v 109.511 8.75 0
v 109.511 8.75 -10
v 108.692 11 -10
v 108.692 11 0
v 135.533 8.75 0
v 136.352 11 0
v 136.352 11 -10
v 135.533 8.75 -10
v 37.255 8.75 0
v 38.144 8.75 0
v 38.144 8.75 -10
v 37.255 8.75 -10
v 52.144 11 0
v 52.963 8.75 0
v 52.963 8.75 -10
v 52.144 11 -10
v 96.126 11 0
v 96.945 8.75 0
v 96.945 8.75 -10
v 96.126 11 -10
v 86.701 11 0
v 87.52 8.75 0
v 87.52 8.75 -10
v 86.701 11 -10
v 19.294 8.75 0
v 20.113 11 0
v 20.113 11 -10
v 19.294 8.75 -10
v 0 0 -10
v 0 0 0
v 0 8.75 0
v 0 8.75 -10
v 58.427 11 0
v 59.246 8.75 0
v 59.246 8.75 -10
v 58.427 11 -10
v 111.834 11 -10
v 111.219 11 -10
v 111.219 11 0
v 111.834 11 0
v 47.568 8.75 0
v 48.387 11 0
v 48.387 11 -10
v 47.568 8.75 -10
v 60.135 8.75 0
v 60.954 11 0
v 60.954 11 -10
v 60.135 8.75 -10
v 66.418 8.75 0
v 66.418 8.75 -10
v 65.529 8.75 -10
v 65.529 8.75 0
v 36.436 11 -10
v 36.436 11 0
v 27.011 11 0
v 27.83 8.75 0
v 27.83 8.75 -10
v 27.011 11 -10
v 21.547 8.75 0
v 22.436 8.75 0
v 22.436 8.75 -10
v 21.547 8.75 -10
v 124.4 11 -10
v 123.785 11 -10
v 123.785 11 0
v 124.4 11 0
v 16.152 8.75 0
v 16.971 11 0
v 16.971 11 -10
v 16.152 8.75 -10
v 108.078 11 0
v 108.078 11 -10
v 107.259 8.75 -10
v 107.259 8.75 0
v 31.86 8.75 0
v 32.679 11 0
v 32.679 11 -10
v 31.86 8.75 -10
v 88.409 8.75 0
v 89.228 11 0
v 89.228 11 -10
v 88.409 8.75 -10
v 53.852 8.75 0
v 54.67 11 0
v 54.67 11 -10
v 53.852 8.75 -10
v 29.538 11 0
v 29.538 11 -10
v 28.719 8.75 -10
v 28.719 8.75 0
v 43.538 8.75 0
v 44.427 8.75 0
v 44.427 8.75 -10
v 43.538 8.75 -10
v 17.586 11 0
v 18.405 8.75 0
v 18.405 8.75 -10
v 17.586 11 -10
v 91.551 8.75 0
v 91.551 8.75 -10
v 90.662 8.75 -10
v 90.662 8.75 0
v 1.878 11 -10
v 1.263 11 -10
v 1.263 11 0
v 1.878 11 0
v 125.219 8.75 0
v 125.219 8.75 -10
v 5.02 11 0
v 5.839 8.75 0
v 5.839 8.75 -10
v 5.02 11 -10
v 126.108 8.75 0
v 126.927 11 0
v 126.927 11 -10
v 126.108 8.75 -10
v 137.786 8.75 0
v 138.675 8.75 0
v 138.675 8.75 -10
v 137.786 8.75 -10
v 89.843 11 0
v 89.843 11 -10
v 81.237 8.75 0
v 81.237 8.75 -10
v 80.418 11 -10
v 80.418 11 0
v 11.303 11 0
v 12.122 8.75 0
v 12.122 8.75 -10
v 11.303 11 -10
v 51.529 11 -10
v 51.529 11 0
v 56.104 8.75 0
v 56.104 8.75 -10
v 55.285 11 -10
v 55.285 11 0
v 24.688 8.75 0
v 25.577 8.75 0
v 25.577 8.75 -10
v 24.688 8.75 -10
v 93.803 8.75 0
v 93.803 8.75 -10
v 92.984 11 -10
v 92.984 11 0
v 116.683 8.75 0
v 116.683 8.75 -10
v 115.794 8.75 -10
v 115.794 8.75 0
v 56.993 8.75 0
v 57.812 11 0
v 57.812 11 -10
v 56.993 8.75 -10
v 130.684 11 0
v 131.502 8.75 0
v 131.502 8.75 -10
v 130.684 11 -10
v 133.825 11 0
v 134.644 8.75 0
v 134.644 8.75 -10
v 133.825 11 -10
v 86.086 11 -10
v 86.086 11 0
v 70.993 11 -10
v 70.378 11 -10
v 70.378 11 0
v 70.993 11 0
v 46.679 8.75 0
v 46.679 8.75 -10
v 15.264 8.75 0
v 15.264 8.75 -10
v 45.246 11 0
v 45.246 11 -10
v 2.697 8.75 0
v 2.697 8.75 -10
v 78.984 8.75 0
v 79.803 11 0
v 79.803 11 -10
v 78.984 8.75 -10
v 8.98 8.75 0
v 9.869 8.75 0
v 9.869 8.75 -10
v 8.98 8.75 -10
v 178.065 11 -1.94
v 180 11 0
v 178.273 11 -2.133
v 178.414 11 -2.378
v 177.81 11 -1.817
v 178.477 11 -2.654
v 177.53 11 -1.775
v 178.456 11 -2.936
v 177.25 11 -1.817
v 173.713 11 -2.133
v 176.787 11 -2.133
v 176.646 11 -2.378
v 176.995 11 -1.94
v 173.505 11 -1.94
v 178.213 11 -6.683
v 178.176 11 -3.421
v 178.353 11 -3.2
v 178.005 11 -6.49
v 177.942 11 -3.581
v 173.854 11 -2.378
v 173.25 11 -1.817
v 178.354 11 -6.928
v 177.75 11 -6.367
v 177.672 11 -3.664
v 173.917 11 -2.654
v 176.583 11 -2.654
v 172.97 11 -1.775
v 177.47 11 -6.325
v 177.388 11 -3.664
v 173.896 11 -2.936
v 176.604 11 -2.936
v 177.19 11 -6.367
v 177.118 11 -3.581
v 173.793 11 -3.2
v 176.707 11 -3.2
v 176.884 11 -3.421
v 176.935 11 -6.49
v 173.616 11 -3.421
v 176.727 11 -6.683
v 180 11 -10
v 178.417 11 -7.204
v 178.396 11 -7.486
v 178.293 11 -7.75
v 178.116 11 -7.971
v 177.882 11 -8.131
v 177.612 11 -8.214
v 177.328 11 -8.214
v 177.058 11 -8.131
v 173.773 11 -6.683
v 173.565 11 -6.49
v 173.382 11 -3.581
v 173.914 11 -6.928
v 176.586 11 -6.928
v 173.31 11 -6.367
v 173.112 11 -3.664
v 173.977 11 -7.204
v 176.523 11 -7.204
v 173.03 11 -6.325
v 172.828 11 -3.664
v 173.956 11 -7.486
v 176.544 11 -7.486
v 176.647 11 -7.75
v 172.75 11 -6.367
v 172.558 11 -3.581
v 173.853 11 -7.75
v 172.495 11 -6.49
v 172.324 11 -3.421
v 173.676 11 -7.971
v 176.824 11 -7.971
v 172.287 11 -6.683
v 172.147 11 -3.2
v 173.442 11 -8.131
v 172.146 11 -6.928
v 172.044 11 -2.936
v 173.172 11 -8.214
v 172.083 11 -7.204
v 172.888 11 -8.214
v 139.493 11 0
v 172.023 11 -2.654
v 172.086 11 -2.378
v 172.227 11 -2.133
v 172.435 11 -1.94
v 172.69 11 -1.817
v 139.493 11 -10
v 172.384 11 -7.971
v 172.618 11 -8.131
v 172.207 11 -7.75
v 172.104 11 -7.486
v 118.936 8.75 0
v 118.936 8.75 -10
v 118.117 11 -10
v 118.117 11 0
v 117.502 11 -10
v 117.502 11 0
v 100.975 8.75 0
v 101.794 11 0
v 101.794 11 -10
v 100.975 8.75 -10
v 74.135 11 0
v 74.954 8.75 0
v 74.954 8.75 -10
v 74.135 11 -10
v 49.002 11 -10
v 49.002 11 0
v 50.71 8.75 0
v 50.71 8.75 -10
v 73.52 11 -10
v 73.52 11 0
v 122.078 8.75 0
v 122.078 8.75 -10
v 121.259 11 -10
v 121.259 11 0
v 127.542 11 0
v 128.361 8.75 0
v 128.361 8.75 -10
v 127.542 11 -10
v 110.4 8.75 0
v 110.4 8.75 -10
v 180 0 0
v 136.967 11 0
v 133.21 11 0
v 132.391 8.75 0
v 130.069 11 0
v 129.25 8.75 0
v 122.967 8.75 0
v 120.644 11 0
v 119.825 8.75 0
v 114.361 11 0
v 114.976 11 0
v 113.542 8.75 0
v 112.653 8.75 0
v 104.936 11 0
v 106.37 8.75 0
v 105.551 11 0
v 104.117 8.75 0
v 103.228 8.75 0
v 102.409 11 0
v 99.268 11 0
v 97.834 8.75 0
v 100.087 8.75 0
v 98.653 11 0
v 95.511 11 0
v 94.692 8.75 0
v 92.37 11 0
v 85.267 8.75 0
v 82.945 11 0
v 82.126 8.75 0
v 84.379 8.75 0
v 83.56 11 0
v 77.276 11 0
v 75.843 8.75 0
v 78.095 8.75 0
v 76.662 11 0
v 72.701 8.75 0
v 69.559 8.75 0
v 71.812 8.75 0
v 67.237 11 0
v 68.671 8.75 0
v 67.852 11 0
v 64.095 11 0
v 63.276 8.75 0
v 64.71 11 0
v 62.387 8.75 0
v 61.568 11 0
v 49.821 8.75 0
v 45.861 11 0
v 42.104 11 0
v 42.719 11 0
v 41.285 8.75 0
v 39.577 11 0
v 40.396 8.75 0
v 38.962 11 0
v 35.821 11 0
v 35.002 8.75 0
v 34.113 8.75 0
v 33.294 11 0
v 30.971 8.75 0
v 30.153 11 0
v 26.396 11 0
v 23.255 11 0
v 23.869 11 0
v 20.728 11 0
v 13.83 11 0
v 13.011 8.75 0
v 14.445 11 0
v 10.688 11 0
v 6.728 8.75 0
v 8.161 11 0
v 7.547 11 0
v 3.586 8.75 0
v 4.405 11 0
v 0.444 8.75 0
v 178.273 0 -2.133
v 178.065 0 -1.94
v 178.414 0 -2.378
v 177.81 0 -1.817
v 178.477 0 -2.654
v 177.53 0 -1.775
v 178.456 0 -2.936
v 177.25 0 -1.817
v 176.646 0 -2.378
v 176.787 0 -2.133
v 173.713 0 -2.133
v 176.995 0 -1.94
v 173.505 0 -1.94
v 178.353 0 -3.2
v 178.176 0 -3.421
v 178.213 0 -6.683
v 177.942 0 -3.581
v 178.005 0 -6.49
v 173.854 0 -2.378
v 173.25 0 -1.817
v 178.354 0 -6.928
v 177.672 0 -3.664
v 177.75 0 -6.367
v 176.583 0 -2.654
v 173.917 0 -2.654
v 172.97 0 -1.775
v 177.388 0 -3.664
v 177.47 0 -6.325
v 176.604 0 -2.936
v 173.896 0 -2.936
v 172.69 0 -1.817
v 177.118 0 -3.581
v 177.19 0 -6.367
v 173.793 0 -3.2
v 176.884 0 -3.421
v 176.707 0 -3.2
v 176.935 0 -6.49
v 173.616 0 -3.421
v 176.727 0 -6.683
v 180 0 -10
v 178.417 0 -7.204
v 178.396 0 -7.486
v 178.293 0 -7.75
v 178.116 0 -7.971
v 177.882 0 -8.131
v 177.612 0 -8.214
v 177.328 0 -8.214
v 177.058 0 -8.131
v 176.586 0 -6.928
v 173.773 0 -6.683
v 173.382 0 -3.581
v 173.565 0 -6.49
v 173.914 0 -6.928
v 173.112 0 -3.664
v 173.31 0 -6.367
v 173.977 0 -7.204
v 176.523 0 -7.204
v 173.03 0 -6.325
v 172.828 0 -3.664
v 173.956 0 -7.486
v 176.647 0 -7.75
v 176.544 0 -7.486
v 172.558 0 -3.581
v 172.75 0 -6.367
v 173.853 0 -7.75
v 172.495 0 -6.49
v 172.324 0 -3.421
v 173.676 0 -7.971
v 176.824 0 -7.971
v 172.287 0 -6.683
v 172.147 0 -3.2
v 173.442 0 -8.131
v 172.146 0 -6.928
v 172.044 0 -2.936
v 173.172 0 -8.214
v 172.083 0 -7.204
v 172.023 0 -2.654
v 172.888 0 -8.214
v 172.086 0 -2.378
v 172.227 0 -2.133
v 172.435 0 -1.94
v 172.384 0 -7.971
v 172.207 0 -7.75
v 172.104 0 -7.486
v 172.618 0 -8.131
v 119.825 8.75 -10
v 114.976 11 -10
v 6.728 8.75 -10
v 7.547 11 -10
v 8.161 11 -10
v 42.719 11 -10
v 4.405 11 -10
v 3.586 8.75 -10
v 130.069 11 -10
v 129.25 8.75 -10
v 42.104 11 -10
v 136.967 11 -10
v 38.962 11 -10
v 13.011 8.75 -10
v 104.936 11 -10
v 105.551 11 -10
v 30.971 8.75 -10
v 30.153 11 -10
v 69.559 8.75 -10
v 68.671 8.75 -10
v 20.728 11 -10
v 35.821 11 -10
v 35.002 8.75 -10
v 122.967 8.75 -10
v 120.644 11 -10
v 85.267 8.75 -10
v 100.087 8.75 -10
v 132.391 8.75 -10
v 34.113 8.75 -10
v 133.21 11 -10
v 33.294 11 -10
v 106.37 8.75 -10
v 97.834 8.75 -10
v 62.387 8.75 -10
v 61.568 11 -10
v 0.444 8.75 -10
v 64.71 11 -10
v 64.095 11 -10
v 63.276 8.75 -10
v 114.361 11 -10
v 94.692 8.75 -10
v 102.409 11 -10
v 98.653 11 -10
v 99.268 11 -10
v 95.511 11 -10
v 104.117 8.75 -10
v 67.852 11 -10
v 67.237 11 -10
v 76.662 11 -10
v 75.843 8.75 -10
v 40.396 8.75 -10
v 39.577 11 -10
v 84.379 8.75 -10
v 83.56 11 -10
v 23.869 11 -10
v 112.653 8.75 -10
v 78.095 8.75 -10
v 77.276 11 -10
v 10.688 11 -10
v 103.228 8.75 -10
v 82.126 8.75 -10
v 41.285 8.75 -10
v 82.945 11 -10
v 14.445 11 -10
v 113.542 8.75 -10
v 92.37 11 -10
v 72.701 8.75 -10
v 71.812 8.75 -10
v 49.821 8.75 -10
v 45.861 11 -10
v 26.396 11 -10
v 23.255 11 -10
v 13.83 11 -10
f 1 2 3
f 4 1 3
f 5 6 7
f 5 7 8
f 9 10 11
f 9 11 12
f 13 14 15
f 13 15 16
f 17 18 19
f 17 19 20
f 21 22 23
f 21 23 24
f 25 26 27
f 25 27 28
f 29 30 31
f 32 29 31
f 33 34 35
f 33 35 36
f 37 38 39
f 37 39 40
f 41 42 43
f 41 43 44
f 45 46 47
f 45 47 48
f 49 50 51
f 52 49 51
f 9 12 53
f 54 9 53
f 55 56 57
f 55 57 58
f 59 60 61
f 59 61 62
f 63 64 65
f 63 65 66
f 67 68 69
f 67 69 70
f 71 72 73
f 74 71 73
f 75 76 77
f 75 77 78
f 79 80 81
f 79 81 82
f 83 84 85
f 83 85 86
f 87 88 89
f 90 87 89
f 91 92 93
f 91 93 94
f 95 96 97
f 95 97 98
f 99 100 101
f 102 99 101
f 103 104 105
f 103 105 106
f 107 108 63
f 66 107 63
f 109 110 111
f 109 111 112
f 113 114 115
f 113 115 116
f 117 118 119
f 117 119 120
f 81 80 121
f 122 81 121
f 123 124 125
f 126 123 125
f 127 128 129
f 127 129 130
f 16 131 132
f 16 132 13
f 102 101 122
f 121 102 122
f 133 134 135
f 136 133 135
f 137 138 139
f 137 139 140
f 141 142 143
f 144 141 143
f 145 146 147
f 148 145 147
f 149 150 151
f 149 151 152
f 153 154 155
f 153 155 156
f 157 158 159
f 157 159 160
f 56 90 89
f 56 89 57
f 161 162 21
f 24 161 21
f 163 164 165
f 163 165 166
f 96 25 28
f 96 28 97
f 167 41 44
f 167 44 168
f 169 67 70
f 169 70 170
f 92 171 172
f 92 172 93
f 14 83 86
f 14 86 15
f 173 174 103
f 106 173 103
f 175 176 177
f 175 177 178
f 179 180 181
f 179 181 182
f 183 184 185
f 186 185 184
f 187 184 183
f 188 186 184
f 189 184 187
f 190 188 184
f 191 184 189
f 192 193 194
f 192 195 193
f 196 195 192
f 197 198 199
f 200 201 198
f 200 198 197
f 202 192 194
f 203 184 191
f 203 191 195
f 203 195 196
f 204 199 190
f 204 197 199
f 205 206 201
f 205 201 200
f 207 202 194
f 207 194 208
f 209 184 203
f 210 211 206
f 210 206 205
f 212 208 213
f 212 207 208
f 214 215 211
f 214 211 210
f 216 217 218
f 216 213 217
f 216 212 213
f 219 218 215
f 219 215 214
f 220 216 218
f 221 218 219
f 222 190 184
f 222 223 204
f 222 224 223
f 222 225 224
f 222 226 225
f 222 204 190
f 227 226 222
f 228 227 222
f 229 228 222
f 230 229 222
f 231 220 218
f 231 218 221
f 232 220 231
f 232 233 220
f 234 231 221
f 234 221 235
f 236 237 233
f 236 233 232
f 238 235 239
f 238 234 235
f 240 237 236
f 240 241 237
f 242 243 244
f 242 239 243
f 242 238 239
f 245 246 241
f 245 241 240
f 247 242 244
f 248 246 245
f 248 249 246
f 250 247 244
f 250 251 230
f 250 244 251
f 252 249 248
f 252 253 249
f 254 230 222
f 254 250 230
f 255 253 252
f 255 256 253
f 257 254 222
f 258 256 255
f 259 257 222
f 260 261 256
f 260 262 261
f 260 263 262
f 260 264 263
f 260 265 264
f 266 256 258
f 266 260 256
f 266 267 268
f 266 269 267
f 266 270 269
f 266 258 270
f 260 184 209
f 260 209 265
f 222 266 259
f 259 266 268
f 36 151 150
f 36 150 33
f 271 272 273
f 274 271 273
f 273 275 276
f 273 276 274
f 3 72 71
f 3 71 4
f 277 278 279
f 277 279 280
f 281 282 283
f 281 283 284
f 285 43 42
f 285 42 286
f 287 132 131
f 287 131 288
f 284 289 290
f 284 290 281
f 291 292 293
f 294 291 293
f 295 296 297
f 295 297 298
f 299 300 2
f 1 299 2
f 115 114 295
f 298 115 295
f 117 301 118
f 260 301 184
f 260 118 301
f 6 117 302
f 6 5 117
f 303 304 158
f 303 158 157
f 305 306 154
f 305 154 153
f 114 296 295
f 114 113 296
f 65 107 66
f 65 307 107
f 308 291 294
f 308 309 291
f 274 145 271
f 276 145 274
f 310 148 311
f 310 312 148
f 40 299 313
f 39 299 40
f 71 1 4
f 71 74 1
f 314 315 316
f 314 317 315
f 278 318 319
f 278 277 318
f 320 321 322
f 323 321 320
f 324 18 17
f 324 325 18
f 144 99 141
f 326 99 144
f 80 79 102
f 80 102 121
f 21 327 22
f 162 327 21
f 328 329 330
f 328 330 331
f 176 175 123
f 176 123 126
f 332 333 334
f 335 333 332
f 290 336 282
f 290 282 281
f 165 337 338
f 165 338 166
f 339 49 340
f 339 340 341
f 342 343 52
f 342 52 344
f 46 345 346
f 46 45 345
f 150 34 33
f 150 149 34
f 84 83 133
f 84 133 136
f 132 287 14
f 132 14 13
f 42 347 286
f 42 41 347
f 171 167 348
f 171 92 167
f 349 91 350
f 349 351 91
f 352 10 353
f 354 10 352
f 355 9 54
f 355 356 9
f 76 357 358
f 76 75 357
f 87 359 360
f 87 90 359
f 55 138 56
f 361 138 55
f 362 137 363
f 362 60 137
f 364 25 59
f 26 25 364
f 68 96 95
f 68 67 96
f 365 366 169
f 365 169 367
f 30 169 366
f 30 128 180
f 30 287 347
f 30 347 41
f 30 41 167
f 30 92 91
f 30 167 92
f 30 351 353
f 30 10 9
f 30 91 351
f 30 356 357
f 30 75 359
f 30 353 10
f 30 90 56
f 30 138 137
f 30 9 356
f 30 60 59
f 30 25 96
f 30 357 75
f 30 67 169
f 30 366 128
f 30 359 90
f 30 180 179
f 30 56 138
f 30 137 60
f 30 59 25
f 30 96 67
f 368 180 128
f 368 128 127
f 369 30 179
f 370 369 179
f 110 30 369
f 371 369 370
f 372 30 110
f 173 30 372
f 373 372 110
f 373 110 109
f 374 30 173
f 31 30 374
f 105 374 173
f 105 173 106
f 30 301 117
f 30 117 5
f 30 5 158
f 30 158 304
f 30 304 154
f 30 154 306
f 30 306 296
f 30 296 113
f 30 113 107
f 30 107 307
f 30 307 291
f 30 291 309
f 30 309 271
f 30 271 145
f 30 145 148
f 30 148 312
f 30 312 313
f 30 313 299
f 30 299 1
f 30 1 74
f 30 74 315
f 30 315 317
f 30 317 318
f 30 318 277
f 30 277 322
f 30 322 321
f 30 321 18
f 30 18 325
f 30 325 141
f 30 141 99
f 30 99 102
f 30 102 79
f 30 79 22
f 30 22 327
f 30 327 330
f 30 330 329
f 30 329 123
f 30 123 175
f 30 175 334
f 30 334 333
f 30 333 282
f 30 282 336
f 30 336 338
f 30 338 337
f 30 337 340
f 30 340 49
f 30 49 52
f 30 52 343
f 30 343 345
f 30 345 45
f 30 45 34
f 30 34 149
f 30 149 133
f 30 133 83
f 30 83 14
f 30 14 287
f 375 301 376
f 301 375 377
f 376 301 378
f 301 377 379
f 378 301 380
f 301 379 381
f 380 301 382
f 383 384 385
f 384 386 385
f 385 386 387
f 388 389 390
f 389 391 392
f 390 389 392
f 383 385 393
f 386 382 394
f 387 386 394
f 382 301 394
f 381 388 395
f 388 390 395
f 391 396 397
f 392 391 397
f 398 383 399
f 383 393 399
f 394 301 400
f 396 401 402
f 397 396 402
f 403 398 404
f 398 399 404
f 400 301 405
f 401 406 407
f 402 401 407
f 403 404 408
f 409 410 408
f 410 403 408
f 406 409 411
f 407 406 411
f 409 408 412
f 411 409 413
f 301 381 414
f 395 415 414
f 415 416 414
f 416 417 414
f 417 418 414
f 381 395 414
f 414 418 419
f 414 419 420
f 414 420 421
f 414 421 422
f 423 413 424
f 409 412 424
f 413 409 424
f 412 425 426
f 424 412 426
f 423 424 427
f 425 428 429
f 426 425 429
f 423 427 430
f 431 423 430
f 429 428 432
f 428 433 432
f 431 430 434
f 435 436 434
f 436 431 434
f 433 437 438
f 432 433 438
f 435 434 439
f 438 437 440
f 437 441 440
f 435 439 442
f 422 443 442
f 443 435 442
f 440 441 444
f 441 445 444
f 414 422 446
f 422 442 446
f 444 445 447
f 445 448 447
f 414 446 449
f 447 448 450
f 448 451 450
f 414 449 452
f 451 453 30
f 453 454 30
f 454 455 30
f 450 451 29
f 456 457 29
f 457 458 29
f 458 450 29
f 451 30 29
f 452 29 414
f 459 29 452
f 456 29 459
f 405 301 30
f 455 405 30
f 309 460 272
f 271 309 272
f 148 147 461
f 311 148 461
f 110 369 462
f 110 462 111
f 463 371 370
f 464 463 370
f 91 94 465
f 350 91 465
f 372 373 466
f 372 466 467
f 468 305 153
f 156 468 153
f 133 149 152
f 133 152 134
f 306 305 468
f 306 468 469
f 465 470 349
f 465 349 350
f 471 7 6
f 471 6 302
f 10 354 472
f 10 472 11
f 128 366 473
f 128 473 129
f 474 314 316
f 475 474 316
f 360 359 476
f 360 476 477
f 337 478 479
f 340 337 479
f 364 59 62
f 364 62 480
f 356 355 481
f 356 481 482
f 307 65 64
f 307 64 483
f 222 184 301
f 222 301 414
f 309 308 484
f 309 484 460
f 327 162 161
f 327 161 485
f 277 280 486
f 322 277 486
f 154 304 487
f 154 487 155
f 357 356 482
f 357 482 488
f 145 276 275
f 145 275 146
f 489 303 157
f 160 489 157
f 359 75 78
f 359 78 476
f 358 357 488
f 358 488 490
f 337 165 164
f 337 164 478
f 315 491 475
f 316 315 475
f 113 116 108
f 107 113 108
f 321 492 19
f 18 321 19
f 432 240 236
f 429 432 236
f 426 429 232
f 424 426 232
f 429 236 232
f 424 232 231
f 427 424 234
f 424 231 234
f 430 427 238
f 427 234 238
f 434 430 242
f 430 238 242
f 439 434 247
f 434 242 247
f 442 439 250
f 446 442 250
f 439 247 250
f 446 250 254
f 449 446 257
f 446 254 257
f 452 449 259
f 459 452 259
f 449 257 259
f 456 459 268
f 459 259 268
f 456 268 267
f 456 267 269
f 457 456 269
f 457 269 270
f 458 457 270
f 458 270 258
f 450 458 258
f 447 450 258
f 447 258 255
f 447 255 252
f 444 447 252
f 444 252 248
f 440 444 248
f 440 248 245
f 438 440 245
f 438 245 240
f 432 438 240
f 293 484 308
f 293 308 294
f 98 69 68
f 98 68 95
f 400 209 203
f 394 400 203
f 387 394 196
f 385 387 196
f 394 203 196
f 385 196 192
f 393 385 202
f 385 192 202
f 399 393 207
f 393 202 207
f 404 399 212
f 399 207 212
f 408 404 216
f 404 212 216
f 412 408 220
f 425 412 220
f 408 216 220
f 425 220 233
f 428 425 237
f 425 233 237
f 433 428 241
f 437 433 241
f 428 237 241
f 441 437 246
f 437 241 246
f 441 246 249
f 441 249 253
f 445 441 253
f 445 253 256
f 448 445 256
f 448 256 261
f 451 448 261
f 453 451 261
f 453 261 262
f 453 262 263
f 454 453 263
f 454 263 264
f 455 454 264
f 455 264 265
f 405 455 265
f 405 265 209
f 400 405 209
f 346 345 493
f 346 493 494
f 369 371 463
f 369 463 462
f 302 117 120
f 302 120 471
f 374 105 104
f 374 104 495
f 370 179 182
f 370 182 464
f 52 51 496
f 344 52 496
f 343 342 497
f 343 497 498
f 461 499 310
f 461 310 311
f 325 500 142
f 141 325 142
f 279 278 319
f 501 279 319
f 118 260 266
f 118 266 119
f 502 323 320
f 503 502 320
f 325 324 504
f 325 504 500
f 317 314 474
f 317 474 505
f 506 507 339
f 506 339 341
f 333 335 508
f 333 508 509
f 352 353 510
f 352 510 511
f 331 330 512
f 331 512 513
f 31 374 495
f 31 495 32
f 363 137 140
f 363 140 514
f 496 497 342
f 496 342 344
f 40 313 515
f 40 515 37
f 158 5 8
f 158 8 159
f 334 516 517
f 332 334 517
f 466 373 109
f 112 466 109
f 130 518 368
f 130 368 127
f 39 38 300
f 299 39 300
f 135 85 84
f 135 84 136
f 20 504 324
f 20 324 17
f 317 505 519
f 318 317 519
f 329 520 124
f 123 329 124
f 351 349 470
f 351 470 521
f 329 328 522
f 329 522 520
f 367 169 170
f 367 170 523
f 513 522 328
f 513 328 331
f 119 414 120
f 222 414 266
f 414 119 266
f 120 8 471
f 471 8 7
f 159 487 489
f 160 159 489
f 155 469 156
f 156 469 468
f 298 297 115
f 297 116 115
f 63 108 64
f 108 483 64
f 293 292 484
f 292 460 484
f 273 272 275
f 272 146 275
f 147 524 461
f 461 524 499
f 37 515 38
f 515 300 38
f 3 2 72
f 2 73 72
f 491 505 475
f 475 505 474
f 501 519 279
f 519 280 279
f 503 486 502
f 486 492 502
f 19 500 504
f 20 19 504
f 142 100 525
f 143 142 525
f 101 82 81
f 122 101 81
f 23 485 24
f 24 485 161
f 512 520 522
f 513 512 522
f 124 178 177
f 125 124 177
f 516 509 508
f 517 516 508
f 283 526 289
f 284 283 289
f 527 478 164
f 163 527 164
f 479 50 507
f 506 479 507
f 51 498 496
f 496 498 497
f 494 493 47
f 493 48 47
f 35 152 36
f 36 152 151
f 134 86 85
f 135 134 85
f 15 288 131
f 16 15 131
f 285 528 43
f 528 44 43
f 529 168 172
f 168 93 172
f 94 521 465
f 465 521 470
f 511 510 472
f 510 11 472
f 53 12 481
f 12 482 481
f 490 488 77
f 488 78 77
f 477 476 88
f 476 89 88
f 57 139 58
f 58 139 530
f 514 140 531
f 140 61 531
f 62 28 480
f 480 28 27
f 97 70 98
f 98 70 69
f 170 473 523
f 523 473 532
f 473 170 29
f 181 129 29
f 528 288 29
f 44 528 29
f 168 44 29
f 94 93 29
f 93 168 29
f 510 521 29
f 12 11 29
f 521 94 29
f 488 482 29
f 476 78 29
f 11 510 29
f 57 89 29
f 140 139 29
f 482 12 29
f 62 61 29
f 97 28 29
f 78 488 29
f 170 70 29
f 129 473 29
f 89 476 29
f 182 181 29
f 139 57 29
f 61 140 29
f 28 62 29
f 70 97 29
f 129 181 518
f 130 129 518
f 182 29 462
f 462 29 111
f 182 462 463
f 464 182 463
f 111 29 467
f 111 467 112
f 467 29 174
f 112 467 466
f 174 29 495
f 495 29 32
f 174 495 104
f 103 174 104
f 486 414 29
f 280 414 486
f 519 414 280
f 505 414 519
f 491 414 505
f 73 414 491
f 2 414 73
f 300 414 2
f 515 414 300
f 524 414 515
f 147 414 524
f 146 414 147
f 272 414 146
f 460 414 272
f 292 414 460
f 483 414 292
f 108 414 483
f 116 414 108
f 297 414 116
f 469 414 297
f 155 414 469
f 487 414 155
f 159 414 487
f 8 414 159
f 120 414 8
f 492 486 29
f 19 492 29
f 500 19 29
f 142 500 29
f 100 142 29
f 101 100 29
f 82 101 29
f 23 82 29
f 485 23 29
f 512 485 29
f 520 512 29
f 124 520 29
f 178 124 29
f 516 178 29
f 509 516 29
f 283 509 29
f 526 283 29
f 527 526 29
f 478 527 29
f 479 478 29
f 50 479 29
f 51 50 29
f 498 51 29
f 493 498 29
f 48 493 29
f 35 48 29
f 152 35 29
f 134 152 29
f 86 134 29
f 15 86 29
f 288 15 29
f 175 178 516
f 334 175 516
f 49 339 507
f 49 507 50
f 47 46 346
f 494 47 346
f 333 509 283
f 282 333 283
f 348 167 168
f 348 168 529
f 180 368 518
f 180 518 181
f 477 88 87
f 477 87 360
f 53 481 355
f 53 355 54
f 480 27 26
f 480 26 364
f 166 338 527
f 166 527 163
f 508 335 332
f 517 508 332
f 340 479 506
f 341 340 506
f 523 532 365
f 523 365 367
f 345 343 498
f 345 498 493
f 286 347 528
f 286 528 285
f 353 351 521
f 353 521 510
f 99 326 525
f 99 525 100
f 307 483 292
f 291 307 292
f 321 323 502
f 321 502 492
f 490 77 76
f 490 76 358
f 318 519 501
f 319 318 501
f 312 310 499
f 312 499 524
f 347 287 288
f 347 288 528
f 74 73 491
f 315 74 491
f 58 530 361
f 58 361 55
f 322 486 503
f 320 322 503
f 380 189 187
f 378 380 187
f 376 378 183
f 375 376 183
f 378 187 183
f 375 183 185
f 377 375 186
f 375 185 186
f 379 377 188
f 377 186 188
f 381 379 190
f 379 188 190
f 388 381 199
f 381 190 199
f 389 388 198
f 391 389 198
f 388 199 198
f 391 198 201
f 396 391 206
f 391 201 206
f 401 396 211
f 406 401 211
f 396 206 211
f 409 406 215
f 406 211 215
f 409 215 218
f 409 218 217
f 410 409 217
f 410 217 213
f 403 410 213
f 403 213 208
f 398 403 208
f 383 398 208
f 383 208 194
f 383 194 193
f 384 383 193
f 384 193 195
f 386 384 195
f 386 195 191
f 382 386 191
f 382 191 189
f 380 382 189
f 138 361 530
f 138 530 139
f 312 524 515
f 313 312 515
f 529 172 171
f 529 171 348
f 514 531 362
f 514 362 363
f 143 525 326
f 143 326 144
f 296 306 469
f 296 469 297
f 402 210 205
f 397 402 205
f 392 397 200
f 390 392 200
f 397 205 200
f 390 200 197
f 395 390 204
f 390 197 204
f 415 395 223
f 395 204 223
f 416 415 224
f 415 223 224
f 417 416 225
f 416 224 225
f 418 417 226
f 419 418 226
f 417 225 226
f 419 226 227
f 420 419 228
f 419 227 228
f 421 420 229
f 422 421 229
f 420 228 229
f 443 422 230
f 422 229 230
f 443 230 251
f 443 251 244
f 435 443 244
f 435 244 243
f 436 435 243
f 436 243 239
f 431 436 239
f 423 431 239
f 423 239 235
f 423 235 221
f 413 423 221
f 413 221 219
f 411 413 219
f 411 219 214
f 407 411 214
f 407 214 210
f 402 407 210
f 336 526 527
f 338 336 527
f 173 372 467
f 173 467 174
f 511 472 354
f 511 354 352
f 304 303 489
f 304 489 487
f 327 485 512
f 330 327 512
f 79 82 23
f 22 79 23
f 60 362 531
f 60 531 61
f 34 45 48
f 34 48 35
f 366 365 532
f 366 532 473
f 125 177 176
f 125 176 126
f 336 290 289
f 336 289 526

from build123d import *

# Parameters (mm, degrees)
BLANKSKE_W          = 140
BLANKSKE_H          = 11
BLANK_DEPTH         = 10
TOOTHCUTSIM_DEPTH   = 141.78707327
TEETHCUTS_COUNT     = 46
TEETHCUTS_PITCH     = 3.14159265
SKETCH1_W           = 10
SKETCH1_H           = 11
BOSS_EXTRUDE1_DEPTH = 40
SKETCH3_R           = 0.95
CUT_EXTRUDE1_DEPTH  = 181.612845612


with BuildPart() as part:
    # BlankSke → Blank (new body)
    with BuildSketch(Plane.XY):
        with Locations((70, 5.5)):
            Rectangle(BLANKSKE_W, BLANKSKE_H)
    extrude(amount=-BLANK_DEPTH)

    # TooCutSkeSim → ToothCutSim (cut, through all)
    with BuildSketch(Plane.XY):
        Polygon((0.44443537, 8.75), (-0.44443537, 8.75), (-1.272613241, 11.0254), (1.272613241, 11.0254), align=None)
    toothcutsim = extrude(amount=-TOOTHCUTSIM_DEPTH, mode=Mode.SUBTRACT)

    # TeethCuts: ToothCutSim ×46
    with Locations(*[(i * TEETHCUTS_PITCH, 0, 0) for i in range(1, TEETHCUTS_COUNT)]):
        add(toothcutsim, mode=Mode.SUBTRACT)

    # Sketch1 → Boss-Extrude1 (add)
    with BuildSketch(Plane(origin=(140, 0, 0), x_dir=(0, 0, -1), z_dir=(1, 0, 0))):
        with Locations((5, 5.5)):
            Rectangle(SKETCH1_W, SKETCH1_H)
    extrude(amount=BOSS_EXTRUDE1_DEPTH)

    # Sketch3 → Cut-Extrude1 (cut, through all)
    with BuildSketch(Plane(origin=(0, 11, 0), x_dir=(1, 0, 0), z_dir=(0, 1, 0))):
        with Locations((173.03, 7.275)):
            Circle(SKETCH3_R)
        with Locations((177.47, 7.275)):
            Circle(SKETCH3_R)
        with Locations((177.53, 2.725)):
            Circle(SKETCH3_R)
        with Locations((172.97, 2.725)):
            Circle(SKETCH3_R)
    extrude(amount=-CUT_EXTRUDE1_DEPTH, mode=Mode.SUBTRACT)


solid = part.part
